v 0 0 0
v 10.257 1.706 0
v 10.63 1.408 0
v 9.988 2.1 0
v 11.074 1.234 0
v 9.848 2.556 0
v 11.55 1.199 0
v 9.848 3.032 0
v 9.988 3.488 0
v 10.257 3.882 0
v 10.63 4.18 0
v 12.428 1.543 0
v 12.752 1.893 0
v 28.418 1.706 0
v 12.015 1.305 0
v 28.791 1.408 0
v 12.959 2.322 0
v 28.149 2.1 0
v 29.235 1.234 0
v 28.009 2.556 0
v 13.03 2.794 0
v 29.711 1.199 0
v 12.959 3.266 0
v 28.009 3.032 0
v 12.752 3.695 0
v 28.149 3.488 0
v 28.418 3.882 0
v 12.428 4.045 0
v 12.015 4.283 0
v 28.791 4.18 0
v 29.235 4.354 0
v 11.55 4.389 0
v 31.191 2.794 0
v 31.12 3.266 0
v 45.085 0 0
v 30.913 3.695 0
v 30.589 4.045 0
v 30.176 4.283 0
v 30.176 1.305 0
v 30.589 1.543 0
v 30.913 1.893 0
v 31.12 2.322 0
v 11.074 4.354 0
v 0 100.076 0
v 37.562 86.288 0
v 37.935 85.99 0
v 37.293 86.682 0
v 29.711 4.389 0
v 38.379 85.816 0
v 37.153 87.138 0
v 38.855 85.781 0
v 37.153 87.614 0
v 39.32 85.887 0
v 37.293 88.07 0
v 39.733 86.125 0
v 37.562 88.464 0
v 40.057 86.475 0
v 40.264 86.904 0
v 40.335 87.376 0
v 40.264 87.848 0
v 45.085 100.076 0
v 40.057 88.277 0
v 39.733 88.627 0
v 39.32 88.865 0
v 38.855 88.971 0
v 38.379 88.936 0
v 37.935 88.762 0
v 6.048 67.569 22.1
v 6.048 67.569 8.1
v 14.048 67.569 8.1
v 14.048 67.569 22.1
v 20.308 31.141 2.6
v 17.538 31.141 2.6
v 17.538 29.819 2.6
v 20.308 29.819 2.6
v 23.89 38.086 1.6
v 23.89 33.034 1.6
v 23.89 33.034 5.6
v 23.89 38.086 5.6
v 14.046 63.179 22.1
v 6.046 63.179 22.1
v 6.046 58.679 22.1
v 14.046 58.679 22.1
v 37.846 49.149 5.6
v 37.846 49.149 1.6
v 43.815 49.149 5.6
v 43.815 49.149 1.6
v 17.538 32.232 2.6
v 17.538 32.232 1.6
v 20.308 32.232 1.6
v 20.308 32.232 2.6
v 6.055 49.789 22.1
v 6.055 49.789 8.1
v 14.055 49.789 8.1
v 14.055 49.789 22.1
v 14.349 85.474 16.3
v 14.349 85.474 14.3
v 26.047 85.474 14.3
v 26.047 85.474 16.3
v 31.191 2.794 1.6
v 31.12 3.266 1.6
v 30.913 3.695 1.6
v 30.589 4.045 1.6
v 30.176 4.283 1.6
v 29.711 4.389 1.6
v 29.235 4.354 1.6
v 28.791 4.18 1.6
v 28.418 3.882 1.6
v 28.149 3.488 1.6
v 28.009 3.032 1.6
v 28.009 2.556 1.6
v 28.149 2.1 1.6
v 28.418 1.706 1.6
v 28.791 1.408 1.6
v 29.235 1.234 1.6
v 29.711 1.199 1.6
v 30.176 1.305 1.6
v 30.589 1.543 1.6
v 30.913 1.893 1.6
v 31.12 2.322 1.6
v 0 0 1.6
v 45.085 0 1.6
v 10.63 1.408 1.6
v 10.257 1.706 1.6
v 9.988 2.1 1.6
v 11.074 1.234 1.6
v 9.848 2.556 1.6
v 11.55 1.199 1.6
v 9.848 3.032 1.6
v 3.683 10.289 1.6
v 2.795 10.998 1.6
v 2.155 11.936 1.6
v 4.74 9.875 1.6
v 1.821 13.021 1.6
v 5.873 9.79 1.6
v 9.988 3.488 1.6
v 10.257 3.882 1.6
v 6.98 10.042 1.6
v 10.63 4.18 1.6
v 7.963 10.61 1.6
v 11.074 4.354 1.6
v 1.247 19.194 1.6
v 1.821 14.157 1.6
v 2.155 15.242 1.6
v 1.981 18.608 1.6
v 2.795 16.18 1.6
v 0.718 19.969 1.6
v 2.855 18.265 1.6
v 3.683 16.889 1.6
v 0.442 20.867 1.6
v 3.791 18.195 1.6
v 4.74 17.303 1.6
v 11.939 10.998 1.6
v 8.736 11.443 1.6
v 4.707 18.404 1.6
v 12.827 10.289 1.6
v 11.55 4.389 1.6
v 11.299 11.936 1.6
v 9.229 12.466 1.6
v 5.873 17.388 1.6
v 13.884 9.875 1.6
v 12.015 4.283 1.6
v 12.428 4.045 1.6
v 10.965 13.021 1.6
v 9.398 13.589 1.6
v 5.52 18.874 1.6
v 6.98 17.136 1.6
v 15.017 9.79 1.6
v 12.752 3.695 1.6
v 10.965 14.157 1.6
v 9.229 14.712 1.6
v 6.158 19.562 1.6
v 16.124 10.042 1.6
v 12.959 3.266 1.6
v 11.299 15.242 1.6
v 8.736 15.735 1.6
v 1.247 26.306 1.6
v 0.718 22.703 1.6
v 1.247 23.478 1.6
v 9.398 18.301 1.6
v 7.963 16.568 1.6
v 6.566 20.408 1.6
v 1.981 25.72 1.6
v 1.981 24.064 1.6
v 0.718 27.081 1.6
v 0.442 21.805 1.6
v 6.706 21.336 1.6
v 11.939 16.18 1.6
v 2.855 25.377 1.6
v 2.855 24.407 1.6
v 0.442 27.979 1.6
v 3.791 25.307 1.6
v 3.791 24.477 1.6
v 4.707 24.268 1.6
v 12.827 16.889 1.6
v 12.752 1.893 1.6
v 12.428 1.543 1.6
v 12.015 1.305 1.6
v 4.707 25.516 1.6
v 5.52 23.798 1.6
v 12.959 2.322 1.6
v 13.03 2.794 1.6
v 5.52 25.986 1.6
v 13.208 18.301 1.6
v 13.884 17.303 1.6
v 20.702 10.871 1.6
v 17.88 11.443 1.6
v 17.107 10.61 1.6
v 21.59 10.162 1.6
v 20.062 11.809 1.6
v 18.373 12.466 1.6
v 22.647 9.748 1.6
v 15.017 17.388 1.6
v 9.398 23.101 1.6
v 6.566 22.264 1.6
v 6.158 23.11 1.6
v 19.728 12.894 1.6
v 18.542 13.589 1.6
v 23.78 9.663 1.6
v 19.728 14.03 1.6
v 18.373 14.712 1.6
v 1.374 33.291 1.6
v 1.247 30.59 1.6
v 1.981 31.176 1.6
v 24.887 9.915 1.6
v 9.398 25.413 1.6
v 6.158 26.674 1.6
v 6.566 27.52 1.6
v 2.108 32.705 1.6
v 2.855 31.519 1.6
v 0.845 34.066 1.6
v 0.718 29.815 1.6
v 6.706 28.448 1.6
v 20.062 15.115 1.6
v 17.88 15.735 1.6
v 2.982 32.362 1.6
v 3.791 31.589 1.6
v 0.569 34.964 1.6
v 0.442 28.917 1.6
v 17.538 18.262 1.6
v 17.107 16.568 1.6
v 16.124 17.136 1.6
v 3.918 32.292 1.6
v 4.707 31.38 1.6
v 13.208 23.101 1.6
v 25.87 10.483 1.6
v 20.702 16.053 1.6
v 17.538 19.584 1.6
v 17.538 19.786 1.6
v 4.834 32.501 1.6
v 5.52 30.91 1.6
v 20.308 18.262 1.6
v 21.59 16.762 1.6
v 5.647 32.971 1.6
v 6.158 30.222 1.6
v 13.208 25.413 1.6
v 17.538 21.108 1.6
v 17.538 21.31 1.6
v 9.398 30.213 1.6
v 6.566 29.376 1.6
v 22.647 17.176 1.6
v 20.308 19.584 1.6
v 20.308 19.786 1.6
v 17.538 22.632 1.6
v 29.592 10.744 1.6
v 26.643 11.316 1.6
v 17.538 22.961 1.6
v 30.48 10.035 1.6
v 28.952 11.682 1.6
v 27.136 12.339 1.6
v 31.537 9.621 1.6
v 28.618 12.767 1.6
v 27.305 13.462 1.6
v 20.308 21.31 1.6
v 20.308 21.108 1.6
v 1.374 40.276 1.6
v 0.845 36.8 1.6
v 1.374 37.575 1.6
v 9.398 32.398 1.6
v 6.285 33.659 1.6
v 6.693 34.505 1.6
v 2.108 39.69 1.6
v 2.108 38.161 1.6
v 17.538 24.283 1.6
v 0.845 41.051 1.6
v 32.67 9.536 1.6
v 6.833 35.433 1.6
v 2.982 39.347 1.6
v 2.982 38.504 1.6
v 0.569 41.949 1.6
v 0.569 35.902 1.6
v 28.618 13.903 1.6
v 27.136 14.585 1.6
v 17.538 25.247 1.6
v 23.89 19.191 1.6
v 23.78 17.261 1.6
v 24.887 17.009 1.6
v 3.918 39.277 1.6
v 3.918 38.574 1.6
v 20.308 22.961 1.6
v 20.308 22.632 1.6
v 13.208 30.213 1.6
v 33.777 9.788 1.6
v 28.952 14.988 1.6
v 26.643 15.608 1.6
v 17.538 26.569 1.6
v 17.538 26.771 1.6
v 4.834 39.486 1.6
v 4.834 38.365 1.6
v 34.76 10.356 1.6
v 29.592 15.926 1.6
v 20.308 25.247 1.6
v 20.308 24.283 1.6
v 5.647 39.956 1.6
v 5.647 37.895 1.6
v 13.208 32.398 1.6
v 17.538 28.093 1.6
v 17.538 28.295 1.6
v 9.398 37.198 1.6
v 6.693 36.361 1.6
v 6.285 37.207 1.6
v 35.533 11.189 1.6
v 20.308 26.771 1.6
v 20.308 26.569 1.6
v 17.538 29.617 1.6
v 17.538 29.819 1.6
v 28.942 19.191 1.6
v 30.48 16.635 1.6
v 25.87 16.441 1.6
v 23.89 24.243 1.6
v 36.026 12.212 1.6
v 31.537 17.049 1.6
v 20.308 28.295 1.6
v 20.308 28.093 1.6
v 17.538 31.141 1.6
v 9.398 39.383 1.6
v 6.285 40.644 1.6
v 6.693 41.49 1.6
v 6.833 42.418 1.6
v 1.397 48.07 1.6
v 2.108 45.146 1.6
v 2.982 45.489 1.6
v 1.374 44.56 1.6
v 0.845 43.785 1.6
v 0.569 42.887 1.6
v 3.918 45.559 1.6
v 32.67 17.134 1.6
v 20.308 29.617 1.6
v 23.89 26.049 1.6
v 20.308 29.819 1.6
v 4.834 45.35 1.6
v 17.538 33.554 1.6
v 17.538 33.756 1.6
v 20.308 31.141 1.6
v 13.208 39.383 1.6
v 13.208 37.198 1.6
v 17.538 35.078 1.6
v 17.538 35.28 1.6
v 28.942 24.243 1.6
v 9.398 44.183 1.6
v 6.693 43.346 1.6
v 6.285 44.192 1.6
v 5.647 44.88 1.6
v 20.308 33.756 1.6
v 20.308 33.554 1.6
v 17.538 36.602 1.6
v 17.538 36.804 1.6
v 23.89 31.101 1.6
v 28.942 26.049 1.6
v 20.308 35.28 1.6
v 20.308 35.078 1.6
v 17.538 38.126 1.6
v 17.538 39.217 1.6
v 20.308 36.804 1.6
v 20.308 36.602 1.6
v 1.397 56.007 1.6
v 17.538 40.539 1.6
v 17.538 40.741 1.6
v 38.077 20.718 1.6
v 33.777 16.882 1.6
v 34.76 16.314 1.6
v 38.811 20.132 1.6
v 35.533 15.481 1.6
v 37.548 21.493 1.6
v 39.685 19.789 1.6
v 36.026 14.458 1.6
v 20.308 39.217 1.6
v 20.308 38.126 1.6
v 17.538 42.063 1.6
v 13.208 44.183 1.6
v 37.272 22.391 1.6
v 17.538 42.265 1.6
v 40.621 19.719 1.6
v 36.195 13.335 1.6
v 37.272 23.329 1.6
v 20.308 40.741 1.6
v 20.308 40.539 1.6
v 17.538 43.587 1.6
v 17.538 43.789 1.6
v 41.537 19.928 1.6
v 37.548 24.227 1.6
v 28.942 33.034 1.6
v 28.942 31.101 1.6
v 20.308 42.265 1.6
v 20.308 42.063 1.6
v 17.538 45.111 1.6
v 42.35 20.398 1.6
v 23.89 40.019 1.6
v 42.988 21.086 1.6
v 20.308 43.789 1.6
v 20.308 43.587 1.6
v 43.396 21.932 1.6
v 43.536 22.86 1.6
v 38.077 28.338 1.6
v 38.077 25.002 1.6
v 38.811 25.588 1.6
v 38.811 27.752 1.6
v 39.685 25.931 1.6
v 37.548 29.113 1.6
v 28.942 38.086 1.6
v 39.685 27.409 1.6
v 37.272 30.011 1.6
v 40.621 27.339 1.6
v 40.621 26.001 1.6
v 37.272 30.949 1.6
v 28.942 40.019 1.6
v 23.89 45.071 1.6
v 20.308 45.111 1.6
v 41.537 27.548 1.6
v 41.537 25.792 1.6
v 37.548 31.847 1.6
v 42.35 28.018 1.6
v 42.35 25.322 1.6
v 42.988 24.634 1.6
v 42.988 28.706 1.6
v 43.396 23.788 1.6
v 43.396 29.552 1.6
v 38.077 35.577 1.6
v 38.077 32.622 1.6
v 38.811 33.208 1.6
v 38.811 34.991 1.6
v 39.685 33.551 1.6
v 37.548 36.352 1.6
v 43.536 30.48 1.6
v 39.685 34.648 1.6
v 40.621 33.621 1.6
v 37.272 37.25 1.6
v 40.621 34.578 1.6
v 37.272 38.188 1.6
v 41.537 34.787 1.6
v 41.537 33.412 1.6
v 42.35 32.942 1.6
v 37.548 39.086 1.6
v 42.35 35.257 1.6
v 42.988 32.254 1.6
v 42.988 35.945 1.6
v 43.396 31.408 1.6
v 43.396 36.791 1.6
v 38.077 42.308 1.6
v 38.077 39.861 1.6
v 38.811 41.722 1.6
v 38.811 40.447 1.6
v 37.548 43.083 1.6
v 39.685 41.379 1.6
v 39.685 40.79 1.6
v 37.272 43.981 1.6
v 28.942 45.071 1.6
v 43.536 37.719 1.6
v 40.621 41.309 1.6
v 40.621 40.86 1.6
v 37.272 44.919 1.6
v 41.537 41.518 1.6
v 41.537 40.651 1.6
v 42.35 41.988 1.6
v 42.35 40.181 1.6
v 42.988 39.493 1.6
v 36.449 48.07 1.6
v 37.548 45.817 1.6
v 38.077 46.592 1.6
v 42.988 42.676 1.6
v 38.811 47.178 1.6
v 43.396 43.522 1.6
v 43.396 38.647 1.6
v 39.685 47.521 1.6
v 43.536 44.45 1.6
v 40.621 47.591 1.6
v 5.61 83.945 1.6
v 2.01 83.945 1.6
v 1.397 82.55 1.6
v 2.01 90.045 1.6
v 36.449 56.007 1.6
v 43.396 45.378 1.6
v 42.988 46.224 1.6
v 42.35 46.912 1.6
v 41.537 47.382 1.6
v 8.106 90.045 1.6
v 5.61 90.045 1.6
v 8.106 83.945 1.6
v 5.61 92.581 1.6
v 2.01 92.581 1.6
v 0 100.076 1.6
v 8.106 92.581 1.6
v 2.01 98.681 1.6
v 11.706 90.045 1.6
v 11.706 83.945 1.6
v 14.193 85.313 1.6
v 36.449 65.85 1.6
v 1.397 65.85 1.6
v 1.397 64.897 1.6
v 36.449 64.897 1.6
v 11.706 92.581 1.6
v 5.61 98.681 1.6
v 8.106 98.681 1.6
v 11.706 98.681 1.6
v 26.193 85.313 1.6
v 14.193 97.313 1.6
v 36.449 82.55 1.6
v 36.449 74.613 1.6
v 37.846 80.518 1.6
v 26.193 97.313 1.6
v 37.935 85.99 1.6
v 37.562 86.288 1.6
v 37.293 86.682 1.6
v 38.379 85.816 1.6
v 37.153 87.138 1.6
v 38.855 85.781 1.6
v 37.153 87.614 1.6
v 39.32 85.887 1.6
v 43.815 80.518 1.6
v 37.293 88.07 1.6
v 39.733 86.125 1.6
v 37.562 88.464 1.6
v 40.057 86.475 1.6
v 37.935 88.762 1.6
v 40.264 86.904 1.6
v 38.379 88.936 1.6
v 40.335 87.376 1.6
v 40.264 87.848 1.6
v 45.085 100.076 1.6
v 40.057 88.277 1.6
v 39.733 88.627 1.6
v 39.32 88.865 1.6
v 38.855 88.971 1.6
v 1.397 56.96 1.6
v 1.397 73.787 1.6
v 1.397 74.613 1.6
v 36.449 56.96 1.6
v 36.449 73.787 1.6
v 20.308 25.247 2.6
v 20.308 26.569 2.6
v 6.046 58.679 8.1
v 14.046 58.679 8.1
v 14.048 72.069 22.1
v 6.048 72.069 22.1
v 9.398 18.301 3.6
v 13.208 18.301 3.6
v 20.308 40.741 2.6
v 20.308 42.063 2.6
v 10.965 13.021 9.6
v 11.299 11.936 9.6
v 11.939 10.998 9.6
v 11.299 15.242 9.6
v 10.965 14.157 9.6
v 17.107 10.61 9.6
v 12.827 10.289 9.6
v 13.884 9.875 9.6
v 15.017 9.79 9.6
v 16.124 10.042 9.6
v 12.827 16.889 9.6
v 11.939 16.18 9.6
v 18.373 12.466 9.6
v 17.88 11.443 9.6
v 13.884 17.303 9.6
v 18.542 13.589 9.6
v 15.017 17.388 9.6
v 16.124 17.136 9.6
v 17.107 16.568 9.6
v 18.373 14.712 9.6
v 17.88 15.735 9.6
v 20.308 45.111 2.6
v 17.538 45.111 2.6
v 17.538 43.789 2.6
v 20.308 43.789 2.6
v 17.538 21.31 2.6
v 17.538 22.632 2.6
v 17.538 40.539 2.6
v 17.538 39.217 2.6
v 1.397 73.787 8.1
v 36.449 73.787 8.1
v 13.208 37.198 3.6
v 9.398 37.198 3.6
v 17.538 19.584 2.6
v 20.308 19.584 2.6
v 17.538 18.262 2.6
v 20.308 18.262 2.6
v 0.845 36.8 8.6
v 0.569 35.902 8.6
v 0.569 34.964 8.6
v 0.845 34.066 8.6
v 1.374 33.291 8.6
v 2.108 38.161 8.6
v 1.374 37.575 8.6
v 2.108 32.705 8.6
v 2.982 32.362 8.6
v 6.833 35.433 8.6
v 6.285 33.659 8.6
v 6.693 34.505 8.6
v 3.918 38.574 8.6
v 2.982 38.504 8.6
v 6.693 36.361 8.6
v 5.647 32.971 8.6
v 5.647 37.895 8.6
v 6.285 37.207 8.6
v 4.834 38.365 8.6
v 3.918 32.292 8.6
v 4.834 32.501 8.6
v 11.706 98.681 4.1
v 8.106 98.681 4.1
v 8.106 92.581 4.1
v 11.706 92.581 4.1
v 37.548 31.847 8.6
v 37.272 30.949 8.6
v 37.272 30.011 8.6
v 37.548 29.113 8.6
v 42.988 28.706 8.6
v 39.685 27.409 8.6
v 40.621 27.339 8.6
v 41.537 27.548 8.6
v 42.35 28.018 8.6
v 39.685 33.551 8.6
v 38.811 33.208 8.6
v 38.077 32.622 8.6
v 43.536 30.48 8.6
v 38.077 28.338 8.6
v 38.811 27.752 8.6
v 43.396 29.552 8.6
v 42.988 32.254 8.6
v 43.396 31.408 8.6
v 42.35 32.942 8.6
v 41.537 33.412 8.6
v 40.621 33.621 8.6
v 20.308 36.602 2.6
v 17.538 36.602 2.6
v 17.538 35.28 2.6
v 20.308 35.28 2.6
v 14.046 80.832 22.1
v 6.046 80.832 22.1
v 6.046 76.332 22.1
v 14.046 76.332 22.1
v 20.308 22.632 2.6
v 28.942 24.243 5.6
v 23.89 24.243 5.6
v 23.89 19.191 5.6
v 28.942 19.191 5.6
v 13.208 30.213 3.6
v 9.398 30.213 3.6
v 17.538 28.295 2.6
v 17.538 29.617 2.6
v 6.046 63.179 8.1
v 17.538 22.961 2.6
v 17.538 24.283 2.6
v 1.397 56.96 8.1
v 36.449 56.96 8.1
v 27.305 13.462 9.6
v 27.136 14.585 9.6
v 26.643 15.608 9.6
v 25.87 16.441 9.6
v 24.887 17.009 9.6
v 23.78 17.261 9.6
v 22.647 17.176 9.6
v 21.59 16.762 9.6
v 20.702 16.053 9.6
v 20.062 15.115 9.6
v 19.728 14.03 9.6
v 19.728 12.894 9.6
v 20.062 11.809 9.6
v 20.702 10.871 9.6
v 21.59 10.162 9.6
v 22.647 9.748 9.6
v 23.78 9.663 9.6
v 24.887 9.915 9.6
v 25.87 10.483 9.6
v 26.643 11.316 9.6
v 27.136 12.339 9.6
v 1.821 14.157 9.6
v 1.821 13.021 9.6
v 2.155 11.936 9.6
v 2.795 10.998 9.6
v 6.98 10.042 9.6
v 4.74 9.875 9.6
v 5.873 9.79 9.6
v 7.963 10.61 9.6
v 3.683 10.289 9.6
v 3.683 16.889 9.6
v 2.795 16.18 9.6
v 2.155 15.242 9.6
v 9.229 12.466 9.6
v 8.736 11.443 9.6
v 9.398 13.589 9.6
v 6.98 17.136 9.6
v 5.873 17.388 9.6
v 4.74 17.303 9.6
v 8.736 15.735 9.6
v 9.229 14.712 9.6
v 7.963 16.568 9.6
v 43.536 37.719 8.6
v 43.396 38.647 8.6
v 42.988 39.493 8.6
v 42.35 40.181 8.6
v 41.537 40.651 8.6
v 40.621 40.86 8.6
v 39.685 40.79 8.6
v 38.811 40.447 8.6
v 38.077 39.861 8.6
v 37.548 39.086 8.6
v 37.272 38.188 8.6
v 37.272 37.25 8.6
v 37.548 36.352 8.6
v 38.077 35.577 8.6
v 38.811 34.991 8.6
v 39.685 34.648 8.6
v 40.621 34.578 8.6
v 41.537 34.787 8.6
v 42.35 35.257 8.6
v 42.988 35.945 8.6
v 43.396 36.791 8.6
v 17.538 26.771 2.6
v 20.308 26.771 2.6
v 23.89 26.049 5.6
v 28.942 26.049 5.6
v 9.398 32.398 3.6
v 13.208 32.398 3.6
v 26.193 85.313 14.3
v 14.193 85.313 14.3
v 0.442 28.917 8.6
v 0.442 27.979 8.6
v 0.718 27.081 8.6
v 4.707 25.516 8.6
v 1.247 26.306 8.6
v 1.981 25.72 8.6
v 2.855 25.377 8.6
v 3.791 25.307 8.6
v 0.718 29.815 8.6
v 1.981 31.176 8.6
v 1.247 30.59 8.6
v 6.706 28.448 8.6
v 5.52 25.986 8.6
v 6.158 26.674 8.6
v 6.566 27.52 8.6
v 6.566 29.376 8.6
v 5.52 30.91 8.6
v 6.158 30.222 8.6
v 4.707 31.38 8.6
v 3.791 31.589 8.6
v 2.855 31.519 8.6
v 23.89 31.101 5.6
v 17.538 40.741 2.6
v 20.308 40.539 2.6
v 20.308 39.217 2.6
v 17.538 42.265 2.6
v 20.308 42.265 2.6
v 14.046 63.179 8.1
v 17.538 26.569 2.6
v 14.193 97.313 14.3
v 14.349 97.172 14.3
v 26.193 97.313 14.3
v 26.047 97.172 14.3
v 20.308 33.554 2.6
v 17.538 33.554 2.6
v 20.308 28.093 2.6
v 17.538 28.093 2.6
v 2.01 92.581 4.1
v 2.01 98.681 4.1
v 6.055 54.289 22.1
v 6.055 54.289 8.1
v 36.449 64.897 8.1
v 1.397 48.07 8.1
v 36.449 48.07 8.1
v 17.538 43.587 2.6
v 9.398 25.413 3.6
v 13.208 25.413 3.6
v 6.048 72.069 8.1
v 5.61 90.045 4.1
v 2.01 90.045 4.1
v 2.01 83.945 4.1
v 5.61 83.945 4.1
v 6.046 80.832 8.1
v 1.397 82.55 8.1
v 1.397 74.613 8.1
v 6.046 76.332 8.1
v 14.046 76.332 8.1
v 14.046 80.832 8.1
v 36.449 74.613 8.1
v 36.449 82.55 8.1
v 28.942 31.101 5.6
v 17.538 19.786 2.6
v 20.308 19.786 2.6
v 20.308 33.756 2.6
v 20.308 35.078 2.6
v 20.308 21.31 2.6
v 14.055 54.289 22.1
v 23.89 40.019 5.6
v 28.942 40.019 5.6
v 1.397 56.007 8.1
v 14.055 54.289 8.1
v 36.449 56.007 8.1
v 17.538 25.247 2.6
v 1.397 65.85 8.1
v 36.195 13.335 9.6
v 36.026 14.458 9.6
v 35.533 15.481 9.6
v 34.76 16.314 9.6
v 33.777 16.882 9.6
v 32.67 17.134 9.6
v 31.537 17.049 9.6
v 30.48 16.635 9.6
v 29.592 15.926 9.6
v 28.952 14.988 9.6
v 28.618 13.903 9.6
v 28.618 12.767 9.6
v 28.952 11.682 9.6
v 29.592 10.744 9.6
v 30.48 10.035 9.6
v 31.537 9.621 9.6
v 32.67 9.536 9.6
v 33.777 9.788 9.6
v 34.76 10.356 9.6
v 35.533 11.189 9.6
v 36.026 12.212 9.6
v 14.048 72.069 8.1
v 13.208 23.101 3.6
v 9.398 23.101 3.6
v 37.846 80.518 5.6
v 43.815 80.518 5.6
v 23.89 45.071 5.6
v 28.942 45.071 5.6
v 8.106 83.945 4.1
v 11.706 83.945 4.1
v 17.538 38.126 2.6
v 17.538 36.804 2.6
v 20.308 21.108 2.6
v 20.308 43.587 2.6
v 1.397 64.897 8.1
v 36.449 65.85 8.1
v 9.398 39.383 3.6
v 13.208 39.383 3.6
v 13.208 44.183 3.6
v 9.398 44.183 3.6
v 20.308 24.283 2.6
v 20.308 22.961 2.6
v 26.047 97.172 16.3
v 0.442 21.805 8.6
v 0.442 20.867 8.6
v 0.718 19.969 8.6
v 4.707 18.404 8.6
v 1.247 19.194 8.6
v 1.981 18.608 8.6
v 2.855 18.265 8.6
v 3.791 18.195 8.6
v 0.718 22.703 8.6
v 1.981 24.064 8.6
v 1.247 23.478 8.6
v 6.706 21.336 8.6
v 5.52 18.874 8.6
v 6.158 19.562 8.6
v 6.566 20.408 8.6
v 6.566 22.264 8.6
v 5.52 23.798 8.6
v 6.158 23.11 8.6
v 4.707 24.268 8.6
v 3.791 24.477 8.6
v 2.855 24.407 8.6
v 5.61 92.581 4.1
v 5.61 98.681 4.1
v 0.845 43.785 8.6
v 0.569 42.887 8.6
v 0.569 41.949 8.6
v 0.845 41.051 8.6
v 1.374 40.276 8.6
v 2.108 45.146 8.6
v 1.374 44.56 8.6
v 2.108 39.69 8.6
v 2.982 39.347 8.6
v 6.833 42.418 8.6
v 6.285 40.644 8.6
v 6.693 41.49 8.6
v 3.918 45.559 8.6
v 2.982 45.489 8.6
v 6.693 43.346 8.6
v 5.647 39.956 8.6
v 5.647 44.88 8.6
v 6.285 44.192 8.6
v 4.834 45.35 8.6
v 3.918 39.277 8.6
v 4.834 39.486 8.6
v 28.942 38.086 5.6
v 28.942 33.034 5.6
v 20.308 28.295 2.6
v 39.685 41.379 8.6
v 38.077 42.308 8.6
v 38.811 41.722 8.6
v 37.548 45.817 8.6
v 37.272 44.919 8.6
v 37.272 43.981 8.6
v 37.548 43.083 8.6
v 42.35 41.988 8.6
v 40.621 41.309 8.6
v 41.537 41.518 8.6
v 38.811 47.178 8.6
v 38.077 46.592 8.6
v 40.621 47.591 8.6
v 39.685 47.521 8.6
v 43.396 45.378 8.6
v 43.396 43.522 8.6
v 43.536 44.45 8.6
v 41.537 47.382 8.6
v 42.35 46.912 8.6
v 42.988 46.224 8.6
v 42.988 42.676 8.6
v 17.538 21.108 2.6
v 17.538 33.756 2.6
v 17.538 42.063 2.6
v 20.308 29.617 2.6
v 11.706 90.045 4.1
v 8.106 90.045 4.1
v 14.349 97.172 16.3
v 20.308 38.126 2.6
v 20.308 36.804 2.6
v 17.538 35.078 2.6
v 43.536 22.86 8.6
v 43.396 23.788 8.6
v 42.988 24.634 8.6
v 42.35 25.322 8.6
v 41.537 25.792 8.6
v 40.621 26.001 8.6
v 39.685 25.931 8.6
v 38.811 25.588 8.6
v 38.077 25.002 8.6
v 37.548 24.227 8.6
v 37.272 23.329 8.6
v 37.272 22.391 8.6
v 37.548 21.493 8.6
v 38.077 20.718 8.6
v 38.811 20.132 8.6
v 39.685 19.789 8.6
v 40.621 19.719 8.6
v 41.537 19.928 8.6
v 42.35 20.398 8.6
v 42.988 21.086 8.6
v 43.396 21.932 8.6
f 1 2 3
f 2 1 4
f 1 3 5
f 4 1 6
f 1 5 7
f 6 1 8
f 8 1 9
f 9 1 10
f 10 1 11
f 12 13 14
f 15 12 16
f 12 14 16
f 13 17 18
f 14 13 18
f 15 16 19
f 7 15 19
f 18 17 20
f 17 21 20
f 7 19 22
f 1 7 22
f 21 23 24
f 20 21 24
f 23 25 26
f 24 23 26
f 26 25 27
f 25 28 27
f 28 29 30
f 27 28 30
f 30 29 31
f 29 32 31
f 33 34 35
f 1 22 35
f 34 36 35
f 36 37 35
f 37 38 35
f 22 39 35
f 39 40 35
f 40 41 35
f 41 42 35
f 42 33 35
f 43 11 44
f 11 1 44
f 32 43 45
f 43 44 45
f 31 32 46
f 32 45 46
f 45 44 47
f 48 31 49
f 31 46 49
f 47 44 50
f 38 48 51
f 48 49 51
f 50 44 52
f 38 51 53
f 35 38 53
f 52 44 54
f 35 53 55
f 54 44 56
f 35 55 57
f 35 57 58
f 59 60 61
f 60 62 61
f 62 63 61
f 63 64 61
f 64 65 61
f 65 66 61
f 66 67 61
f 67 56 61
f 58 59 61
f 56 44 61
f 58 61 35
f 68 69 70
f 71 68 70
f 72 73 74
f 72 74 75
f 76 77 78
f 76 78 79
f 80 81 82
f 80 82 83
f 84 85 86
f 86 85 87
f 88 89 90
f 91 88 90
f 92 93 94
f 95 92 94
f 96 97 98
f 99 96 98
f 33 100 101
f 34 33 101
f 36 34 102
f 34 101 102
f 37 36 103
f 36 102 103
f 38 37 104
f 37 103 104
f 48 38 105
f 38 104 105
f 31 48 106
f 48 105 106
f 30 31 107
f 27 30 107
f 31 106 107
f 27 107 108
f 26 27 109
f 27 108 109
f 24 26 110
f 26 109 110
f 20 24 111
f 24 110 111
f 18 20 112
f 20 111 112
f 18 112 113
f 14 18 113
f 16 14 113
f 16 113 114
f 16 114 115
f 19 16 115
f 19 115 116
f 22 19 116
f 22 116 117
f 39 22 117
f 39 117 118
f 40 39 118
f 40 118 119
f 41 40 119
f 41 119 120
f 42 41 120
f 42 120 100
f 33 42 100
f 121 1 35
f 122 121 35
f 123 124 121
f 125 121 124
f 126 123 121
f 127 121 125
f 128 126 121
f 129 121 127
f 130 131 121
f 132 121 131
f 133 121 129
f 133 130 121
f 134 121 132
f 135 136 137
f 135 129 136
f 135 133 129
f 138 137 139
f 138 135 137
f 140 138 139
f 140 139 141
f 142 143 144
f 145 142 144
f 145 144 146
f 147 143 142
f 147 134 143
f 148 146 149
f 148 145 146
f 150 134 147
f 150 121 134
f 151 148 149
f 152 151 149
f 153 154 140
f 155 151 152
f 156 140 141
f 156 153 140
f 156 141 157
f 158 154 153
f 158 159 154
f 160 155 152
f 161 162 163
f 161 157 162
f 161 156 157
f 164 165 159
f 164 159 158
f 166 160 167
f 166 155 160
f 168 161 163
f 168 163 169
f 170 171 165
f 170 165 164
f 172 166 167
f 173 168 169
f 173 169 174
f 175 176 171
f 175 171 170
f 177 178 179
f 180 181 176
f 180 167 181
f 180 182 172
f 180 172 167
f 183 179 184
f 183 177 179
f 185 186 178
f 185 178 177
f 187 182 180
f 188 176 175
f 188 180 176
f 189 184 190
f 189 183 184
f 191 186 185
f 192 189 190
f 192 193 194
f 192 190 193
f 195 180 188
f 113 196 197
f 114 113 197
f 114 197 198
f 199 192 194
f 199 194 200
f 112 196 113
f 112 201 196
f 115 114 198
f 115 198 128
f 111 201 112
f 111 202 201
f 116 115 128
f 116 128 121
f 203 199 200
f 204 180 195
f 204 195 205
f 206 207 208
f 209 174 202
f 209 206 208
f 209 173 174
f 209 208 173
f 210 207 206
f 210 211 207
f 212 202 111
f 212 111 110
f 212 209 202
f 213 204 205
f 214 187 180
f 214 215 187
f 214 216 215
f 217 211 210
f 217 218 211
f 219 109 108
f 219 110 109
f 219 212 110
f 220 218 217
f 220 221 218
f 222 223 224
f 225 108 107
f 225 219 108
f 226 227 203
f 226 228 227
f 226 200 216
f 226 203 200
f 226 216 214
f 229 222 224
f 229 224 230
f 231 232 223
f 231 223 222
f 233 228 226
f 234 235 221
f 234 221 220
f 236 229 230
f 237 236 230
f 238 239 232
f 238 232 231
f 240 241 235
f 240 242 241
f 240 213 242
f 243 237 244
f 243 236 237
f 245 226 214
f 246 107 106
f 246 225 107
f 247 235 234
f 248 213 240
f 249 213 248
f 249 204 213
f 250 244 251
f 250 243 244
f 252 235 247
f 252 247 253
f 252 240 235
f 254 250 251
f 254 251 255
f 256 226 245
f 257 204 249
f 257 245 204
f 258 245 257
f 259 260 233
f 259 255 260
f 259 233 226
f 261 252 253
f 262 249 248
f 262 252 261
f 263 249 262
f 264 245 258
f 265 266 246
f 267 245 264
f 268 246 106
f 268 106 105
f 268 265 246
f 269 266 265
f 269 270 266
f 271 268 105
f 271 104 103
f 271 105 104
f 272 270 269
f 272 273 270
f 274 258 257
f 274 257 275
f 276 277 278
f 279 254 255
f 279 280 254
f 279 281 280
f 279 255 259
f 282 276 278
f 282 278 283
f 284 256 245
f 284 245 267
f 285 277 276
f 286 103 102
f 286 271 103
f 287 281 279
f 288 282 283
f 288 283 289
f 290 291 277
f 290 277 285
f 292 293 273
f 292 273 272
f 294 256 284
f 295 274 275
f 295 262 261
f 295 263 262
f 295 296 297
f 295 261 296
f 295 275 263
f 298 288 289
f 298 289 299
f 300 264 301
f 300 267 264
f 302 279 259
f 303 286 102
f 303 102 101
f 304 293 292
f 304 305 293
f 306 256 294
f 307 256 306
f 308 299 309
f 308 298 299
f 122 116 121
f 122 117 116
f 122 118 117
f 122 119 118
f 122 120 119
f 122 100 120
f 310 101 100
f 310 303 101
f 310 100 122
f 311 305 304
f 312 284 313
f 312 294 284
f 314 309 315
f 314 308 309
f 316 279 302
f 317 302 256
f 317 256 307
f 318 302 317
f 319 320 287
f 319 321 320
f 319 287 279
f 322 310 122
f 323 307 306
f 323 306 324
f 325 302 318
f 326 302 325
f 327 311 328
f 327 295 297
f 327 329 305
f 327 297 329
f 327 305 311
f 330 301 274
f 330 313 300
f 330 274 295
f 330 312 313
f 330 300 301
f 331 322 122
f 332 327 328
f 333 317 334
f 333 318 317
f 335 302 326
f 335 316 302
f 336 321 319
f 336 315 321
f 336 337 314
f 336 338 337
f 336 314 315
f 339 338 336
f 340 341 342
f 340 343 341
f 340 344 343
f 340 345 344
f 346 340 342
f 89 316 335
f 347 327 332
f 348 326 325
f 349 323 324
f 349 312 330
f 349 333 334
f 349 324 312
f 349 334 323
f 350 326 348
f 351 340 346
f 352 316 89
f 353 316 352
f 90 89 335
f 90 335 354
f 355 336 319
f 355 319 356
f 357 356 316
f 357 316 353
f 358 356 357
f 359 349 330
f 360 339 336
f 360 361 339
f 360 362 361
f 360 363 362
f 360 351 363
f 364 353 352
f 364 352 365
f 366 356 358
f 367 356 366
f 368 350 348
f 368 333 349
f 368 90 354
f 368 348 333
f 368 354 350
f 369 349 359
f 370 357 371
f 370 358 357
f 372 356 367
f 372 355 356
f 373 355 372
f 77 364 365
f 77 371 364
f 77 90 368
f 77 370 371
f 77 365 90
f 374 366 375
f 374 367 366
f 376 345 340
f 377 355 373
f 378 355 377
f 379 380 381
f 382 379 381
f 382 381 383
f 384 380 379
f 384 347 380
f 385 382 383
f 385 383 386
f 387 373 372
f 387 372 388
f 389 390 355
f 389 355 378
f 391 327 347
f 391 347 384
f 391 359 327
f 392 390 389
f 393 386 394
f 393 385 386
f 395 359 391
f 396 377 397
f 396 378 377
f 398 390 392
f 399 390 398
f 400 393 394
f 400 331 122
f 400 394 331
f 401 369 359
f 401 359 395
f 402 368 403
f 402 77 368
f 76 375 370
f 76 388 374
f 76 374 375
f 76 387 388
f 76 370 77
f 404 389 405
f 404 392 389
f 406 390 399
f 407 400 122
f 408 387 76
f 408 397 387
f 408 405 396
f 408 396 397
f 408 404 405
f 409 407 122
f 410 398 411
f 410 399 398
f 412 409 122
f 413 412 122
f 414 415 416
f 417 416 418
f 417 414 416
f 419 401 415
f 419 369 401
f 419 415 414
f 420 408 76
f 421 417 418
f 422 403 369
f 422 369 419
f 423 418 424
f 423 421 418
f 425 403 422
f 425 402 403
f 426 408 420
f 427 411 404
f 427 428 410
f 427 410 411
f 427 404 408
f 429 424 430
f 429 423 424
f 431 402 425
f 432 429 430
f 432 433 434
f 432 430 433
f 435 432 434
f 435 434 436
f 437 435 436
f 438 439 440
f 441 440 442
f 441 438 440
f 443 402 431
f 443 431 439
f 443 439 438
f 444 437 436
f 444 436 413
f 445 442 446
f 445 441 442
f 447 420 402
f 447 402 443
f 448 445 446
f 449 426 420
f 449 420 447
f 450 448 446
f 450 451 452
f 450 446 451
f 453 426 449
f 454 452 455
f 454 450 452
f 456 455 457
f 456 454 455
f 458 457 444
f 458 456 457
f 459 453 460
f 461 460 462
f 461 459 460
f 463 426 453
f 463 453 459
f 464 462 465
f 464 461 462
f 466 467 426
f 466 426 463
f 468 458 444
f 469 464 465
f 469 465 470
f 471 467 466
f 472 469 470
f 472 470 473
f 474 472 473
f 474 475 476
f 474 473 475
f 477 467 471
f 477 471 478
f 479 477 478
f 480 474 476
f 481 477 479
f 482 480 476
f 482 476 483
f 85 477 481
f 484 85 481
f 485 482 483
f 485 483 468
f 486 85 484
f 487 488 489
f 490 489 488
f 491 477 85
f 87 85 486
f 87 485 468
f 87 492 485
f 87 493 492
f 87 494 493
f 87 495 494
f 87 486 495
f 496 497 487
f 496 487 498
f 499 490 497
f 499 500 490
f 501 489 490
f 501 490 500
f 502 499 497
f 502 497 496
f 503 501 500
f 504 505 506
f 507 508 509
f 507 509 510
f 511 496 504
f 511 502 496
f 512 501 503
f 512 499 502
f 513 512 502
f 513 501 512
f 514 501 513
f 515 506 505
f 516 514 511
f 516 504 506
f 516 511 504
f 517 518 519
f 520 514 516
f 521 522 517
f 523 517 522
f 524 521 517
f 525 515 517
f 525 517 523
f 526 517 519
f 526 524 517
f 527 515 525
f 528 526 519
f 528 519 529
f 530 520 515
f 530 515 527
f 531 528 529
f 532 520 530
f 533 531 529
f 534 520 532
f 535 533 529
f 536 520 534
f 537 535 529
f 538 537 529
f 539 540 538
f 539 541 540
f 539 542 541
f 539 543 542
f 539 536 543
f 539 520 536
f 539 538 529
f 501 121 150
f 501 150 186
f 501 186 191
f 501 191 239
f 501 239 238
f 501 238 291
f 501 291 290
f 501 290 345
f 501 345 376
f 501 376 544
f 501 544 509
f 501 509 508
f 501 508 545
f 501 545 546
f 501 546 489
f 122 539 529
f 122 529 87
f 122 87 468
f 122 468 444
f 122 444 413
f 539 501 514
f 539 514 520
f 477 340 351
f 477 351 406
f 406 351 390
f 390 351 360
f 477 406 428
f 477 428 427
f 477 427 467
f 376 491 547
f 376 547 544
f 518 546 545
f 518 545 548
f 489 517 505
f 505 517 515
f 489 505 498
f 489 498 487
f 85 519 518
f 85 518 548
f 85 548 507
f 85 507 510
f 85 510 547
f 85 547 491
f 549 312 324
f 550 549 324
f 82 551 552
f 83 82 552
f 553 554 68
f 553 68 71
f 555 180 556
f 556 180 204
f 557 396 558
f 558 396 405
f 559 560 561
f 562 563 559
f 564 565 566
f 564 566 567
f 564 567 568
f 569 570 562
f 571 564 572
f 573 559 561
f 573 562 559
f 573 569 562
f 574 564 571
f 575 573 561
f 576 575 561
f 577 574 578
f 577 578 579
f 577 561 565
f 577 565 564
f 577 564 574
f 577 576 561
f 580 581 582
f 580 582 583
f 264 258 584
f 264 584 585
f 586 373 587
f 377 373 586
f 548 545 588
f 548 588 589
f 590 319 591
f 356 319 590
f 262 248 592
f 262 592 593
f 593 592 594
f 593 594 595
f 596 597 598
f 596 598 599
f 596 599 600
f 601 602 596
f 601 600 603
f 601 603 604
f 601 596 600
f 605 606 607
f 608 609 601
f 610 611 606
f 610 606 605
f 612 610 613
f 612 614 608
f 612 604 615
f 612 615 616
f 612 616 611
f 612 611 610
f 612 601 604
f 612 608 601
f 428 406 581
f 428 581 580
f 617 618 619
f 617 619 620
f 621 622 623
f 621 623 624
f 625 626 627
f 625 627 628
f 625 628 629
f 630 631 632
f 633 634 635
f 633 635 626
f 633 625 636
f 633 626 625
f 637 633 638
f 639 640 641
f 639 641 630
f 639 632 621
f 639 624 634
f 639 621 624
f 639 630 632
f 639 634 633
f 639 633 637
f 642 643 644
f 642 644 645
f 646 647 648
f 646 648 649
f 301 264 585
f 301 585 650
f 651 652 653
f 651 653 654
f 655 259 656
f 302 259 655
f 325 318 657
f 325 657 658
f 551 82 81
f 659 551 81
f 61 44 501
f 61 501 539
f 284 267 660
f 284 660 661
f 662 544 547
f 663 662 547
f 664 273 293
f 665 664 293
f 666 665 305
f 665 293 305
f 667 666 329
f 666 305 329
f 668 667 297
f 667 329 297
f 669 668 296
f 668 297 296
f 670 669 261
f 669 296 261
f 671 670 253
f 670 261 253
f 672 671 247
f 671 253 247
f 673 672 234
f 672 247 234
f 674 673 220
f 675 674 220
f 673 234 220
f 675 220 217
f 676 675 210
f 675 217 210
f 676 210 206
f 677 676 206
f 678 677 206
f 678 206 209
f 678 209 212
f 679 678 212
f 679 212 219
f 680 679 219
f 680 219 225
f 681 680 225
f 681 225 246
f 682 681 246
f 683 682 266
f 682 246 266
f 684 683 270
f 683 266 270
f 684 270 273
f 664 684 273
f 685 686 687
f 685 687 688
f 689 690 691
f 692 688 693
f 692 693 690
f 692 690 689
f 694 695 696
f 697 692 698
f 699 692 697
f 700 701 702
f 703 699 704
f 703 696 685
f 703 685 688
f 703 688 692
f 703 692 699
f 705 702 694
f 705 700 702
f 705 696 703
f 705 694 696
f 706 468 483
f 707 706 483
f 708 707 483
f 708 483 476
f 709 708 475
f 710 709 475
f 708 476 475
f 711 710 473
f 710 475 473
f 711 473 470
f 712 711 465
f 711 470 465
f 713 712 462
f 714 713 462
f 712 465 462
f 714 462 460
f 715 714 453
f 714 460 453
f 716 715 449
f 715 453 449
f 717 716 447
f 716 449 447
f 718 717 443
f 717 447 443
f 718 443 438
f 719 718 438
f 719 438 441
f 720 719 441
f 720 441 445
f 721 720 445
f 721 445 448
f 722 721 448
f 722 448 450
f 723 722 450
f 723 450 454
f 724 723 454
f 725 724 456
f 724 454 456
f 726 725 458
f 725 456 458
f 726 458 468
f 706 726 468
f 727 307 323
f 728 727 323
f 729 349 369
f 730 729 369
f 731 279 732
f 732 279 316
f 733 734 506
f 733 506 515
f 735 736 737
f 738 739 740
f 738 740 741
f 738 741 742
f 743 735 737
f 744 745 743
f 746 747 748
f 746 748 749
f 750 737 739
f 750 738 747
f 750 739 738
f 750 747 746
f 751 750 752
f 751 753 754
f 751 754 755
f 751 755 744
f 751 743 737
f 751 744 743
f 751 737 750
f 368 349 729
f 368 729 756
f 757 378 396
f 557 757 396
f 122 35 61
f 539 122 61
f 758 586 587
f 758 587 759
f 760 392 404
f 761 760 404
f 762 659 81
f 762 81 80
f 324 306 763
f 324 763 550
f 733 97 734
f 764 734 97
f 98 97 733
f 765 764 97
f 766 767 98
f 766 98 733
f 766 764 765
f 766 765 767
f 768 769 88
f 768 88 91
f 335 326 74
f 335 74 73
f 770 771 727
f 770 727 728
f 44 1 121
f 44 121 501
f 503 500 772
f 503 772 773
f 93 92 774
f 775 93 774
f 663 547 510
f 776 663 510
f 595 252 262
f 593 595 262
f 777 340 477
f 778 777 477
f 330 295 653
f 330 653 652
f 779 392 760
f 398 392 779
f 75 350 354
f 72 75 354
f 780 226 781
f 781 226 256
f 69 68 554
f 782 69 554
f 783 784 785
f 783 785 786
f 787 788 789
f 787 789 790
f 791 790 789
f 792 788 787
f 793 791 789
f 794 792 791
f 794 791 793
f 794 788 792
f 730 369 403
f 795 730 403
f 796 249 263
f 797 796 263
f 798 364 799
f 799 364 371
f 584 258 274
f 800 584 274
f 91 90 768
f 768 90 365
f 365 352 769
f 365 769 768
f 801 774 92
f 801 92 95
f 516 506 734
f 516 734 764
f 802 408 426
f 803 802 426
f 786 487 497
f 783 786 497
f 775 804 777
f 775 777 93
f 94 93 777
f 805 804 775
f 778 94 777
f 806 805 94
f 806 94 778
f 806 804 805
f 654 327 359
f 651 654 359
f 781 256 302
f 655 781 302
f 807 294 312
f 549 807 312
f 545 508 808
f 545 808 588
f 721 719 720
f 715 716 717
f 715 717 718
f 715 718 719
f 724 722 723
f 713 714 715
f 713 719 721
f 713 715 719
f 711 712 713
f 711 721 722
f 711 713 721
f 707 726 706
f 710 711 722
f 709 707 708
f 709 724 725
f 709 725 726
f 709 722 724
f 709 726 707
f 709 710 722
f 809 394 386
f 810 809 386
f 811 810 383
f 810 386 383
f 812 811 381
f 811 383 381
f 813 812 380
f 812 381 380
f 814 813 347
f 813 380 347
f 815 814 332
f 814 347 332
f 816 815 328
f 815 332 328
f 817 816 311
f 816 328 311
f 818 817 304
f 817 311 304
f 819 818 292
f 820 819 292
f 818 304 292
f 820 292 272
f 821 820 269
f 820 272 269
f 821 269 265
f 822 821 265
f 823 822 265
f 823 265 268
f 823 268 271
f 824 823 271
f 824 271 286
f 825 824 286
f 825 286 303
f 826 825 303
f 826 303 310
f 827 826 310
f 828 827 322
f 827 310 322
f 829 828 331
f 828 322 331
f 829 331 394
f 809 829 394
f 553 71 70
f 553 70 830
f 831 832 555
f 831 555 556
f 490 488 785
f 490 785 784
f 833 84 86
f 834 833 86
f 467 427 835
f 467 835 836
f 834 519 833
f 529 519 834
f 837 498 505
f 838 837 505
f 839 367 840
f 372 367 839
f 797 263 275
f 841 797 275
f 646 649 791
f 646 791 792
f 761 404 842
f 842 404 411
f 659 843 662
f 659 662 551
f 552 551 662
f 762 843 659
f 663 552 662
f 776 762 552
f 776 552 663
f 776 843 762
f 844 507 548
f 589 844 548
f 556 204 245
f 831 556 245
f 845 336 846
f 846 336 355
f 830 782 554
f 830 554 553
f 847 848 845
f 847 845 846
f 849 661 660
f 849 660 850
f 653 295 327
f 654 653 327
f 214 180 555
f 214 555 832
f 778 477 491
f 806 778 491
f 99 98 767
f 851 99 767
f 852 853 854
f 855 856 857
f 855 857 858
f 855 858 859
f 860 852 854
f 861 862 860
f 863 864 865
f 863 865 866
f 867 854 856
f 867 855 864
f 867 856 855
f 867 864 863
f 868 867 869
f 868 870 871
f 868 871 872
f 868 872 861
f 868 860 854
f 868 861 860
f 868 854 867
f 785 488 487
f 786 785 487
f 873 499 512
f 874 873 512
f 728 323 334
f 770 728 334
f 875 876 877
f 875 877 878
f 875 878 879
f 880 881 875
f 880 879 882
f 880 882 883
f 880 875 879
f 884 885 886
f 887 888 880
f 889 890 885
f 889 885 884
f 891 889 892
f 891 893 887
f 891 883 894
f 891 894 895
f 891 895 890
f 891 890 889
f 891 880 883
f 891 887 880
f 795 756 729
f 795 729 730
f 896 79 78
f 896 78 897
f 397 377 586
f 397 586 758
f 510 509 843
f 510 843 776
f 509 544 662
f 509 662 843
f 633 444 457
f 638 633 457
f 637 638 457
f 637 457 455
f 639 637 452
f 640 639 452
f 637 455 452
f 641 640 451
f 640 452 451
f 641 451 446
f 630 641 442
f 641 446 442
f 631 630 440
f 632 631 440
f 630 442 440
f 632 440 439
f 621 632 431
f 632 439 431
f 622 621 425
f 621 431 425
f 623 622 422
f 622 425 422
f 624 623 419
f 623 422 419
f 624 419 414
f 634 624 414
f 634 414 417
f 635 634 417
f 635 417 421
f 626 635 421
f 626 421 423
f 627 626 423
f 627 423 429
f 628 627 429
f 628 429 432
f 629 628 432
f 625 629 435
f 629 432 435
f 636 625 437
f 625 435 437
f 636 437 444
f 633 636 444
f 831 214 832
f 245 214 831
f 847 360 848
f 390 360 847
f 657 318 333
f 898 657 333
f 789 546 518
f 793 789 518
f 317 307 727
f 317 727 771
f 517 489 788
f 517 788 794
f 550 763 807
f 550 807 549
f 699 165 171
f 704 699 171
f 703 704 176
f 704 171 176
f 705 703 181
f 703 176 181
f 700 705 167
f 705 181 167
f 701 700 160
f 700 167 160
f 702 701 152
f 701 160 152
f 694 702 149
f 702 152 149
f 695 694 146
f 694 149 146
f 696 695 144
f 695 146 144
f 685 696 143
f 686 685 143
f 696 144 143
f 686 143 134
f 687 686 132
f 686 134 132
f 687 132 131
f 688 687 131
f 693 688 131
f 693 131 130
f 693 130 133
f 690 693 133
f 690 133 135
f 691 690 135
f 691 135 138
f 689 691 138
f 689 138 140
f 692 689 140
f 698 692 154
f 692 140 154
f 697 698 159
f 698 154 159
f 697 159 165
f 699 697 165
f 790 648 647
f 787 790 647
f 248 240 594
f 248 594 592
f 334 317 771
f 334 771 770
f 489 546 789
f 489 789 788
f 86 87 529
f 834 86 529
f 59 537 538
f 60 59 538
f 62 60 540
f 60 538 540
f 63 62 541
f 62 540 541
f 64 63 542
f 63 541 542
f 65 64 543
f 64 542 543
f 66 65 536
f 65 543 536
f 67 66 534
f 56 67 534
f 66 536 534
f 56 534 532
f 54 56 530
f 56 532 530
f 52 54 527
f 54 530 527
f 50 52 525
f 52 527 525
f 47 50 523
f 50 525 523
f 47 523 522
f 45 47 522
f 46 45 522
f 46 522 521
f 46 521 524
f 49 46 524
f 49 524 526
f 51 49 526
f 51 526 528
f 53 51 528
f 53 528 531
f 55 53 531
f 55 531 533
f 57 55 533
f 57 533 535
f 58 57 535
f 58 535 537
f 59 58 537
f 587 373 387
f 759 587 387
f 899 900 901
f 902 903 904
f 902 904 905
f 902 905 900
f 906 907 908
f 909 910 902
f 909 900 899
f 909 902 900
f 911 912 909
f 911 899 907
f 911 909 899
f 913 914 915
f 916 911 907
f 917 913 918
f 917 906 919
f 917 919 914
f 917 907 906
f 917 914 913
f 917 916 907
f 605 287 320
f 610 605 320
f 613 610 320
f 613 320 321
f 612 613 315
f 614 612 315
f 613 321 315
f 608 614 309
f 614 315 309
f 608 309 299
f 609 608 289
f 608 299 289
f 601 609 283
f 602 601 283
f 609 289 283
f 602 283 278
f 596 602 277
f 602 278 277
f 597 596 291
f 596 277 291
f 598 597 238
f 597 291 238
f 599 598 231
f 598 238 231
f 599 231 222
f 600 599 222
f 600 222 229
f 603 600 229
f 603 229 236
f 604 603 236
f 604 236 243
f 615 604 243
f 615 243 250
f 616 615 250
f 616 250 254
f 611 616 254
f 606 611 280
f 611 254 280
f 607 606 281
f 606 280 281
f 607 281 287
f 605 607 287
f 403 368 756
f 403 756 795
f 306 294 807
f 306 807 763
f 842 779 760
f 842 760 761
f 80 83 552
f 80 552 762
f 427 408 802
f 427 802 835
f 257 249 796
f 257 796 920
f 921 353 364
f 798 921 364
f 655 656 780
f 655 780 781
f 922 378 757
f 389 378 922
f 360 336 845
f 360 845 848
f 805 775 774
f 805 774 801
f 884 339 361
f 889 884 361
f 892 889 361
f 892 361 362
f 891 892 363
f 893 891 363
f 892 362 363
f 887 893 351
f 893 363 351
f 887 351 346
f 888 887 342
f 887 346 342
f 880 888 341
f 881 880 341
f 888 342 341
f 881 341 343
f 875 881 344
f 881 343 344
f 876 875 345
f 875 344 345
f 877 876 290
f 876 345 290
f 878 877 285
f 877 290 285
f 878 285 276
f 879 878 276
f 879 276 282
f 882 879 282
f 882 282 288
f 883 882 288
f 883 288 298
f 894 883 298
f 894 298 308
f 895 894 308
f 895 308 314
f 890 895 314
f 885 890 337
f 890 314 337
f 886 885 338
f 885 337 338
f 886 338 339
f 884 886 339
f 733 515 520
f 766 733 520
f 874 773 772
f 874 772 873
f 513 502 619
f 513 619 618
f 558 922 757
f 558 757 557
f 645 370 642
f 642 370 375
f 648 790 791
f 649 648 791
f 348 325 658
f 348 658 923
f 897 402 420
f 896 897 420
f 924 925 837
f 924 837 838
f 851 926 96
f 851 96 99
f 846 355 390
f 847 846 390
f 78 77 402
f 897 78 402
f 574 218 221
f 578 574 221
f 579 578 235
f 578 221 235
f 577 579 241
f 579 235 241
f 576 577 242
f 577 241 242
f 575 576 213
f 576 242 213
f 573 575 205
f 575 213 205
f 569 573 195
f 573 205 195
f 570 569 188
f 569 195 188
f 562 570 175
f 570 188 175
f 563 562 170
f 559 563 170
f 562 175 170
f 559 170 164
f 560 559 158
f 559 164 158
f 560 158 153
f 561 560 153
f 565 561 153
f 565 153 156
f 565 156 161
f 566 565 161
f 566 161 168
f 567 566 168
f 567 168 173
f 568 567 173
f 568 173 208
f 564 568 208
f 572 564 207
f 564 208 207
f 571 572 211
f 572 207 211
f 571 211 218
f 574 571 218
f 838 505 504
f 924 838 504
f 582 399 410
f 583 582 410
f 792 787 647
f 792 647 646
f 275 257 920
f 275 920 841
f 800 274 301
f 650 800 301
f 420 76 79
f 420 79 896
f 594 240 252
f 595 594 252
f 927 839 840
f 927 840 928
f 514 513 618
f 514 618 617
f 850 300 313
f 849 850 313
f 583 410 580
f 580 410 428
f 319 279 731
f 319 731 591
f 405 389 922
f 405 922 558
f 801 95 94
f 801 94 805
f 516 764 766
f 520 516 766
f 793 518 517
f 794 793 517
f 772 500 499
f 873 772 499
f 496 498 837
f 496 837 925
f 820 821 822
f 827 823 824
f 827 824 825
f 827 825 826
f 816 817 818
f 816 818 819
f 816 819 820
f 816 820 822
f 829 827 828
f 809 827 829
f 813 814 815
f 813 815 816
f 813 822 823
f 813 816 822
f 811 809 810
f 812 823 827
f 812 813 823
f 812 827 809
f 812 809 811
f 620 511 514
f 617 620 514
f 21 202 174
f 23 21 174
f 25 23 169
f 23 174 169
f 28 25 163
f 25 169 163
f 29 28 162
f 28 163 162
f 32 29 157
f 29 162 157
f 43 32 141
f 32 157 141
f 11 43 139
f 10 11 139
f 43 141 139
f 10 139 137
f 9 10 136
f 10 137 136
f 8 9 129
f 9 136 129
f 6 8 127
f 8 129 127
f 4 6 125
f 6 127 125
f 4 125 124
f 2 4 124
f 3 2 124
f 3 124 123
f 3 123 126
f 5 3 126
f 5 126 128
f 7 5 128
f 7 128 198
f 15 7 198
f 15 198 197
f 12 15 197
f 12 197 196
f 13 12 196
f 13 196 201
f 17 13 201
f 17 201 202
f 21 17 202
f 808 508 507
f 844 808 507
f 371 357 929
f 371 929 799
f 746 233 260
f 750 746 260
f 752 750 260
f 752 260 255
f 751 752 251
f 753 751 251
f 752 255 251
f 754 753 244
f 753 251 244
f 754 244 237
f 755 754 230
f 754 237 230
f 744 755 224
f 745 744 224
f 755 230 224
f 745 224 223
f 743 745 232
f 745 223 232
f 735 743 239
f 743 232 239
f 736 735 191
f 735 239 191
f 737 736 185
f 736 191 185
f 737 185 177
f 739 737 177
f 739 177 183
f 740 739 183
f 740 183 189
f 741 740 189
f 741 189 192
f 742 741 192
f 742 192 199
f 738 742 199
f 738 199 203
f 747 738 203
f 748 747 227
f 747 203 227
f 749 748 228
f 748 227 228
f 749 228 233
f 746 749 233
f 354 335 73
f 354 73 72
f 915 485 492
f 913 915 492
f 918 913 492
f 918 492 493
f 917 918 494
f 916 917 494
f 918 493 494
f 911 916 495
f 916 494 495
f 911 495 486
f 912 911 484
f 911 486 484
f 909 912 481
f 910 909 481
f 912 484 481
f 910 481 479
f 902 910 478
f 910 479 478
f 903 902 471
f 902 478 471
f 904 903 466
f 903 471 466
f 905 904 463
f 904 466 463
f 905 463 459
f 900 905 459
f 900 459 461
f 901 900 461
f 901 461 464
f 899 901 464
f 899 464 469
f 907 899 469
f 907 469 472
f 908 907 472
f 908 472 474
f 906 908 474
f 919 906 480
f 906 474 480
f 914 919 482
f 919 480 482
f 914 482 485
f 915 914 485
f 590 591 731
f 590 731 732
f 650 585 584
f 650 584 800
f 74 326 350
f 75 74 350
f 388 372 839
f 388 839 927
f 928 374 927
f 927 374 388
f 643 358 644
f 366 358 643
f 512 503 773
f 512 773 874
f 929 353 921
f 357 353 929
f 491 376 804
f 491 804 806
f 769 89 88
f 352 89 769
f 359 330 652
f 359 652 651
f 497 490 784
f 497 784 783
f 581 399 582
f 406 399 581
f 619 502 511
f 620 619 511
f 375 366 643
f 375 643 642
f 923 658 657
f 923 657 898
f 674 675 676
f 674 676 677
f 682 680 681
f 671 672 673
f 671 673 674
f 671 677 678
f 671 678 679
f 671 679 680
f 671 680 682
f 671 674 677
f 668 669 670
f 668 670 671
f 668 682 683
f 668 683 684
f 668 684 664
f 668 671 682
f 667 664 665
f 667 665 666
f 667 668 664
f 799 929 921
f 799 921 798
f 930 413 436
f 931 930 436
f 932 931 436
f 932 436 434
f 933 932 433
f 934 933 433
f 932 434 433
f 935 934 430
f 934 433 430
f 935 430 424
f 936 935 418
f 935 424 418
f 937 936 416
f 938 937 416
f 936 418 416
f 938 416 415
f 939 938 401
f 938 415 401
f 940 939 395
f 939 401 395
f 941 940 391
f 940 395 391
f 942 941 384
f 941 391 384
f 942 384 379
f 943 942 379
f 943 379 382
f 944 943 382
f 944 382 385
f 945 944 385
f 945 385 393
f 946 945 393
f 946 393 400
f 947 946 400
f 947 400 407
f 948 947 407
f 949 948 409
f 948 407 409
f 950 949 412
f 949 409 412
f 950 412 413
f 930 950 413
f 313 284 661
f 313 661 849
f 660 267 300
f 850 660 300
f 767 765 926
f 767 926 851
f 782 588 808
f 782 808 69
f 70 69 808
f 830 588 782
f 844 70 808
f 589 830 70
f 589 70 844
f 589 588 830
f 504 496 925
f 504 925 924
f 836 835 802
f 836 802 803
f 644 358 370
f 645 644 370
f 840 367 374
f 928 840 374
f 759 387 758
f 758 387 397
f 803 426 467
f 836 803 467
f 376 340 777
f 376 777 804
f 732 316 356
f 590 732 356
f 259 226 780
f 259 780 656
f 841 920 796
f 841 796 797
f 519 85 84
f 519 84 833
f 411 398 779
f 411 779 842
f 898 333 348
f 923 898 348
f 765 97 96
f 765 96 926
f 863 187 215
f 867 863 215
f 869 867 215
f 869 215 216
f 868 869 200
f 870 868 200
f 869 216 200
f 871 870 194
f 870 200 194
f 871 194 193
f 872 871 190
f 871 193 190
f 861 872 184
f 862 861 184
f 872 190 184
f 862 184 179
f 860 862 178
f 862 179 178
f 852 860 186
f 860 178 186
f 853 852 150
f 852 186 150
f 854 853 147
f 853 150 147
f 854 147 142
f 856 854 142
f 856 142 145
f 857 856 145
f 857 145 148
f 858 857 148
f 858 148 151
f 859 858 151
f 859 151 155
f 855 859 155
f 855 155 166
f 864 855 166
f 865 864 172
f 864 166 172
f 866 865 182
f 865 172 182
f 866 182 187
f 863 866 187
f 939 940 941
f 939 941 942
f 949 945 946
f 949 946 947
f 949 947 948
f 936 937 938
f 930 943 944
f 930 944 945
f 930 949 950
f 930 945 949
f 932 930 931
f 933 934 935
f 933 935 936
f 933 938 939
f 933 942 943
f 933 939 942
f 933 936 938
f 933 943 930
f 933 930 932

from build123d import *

# Parameters (mm, degrees)
SKETCH_2_W          = 45.085
SKETCH_2_H          = 100.076
EXTRUDE_1_DEPTH     = 1.6
SKETCH_3_W          = 3.6000436
SKETCH_3_H          = 6.0999624
EXTRUDE_2_DEPTH     = 2.5
SKETCH_4_W          = 35.0519492
SKETCH_4_H          = 7.9370174
EXTRUDE_3_DEPTH     = 6.5
SKETCH_5_W          = 8
SKETCH_5_H          = 4.5
EXTRUDE_4_DEPTH     = 14
SKETCH_6_W          = 11.999976
SKETCH_6_H          = 11.999976
EXTRUDE_5_DEPTH     = 12.7
SKETCH_8_W          = 11.69819953
SKETCH_8_H          = 11.69819953
EXTRUDE_8_DEPTH     = 2
SKETCH_9_R          = 1.599946
CUT_EXTRUDE_1_DEPTH = 2
SKETCH_10_R         = 3.81
EXTRUDE_9_DEPTH     = 8
SKETCH_11_W         = 5.969
SKETCH_11_H         = 31.369
EXTRUDE_10_DEPTH    = 4
SKETCH_12_W         = 3.81
SKETCH_12_H         = 4.800092
EXTRUDE_11_DEPTH    = 2
SKETCH_13_R         = 3.1496
EXTRUDE_12_DEPTH    = 7
SKETCH_14_W         = 2.7701748
SKETCH_14_H         = 1.3212064
EXTRUDE_13_DEPTH    = 1
SKETCH_15_W         = 5.0524156
SKETCH_15_H         = 5.0524156
EXTRUDE_14_DEPTH    = 4


with BuildPart() as part:
    # 草图2 → 凸台-拉伸1 (new body)
    with BuildSketch(Plane.XY):
        with Locations((22.5425, 50.038)):
            Rectangle(SKETCH_2_W, SKETCH_2_H)
    extrude(amount=EXTRUDE_1_DEPTH)

    # 草图3 → 凸台-拉伸2 (add)
    with BuildSketch(Plane.XY.offset(1.6)):
        with Locations((3.81, 95.631)):
            Rectangle(SKETCH_3_W, SKETCH_3_H)
        with Locations((9.906, 95.631)):
            Rectangle(SKETCH_3_W, SKETCH_3_H)
        with Locations((3.81, 86.995)):
            Rectangle(SKETCH_3_W, SKETCH_3_H)
        with Locations((9.906, 86.995)):
            Rectangle(SKETCH_3_W, SKETCH_3_H)
    extrude(amount=EXTRUDE_2_DEPTH)

    # 草图4 → 凸台-拉伸3 (add)
    with BuildSketch(Plane.XY.offset(1.6)):
        with Locations((18.923, 78.5815421)):
            Rectangle(SKETCH_4_W, SKETCH_4_H)
        with Locations((18.923, 69.8185421)):
            Rectangle(SKETCH_4_W, SKETCH_4_H)
        with Locations((18.923, 60.9285421)):
            Rectangle(SKETCH_4_W, SKETCH_4_H)
        with Locations((18.923, 52.0385421)):
            Rectangle(SKETCH_4_W, SKETCH_4_H)
    extrude(amount=EXTRUDE_3_DEPTH)

    # 草图5 → 凸台-拉伸4 (add)
    with BuildSketch(Plane.XY.offset(8.1)):
        with Locations((10.046059562, 78.5815421)):
            Rectangle(SKETCH_5_W, SKETCH_5_H)
        with Locations((10.047675227, 69.8185421)):
            Rectangle(SKETCH_5_W, SKETCH_5_H)
        with Locations((10.046401334, 60.9285421)):
            Rectangle(SKETCH_5_W, SKETCH_5_H)
        with Locations((10.054884801, 52.0385421)):
            Rectangle(SKETCH_5_W, SKETCH_5_H)
    extrude(amount=EXTRUDE_4_DEPTH)

    # 草图6 → 凸台-拉伸5 (add)
    with BuildSketch(Plane.XY.offset(1.6)):
        with Locations((20.193, 91.313)):
            Rectangle(SKETCH_6_W, SKETCH_6_H)
    extrude(amount=EXTRUDE_5_DEPTH)

    # 草图8 → 凸台-拉伸8 (add)
    with BuildSketch(Plane.XY.offset(14.3)):
        with Locations((20.198016327, 91.323022246)):
            Rectangle(SKETCH_8_W, SKETCH_8_H)
    extrude(amount=EXTRUDE_8_DEPTH)

    # 草图9 → 切除-拉伸1 (cut)
    with BuildSketch(Plane.XY.offset(1.6)):
        with Locations((38.735, 87.376)):
            Circle(SKETCH_9_R)
        with Locations((29.591, 2.794)):
            Circle(SKETCH_9_R)
        with Locations((11.43, 2.794)):
            Circle(SKETCH_9_R)
    extrude(amount=-CUT_EXTRUDE_1_DEPTH, mode=Mode.SUBTRACT)

    # 草图10 → 凸台-拉伸9 (add)
    with BuildSketch(Plane.XY.offset(1.6)):
        with Locations((5.588, 13.589)):
            Circle(SKETCH_10_R)
        with Locations((14.732, 13.589)):
            Circle(SKETCH_10_R)
        with Locations((23.495, 13.462)):
            Circle(SKETCH_10_R)
        with Locations((32.385, 13.335)):
            Circle(SKETCH_10_R)
    extrude(amount=EXTRUDE_9_DEPTH)

    # 草图11 → 凸台-拉伸10 (add)
    with BuildSketch(Plane.XY.offset(1.6)):
        with Locations((40.8305, 64.8335)):
            Rectangle(SKETCH_11_W, SKETCH_11_H)
    extrude(amount=EXTRUDE_10_DEPTH)

    # 草图12 → 凸台-拉伸11 (add)
    with BuildSketch(Plane.XY.offset(1.6)):
        with Locations((11.303, 41.783)):
            Rectangle(SKETCH_12_W, SKETCH_12_H)
        with Locations((11.303, 34.798)):
            Rectangle(SKETCH_12_W, SKETCH_12_H)
        with Locations((11.303, 27.813)):
            Rectangle(SKETCH_12_W, SKETCH_12_H)
        with Locations((11.303, 20.701)):
            Rectangle(SKETCH_12_W, SKETCH_12_H)
    extrude(amount=EXTRUDE_11_DEPTH)

    # 草图13 → 凸台-拉伸12 (add)
    with BuildSketch(Plane.XY.offset(1.6)):
        with Locations((3.683, 42.418)):
            Circle(SKETCH_13_R)
        with Locations((3.683, 35.433)):
            Circle(SKETCH_13_R)
        with Locations((3.556, 28.448)):
            Circle(SKETCH_13_R)
        with Locations((3.556, 21.336)):
            Circle(SKETCH_13_R)
        with Locations((40.386, 44.45)):
            Circle(SKETCH_13_R)
        with Locations((40.386, 37.719)):
            Circle(SKETCH_13_R)
        with Locations((40.386, 30.48)):
            Circle(SKETCH_13_R)
        with Locations((40.386, 22.86)):
            Circle(SKETCH_13_R)
    extrude(amount=EXTRUDE_12_DEPTH)

    # 草图14 → 凸台-拉伸13 (add)
    with BuildSketch(Plane.XY.offset(1.6)):
        with Locations((18.923, 44.45)):
            Rectangle(SKETCH_14_W, SKETCH_14_H)
        with Locations((18.923, 42.926)):
            Rectangle(SKETCH_14_W, SKETCH_14_H)
        with Locations((18.923, 41.402)):
            Rectangle(SKETCH_14_W, SKETCH_14_H)
        with Locations((18.923, 39.878)):
            Rectangle(SKETCH_14_W, SKETCH_14_H)
        with Locations((18.923, 37.465)):
            Rectangle(SKETCH_14_W, SKETCH_14_H)
        with Locations((18.923, 35.941)):
            Rectangle(SKETCH_14_W, SKETCH_14_H)
        with Locations((18.923, 34.417)):
            Rectangle(SKETCH_14_W, SKETCH_14_H)
        with Locations((18.923, 32.893)):
            Rectangle(SKETCH_14_W, SKETCH_14_H)
        with Locations((18.923, 30.48)):
            Rectangle(SKETCH_14_W, SKETCH_14_H)
        with Locations((18.923, 18.923)):
            Rectangle(SKETCH_14_W, SKETCH_14_H)
        with Locations((18.923, 20.447)):
            Rectangle(SKETCH_14_W, SKETCH_14_H)
        with Locations((18.923, 21.971)):
            Rectangle(SKETCH_14_W, SKETCH_14_H)
        with Locations((18.923, 23.622)):
            Rectangle(SKETCH_14_W, SKETCH_14_H)
        with Locations((18.923, 25.908)):
            Rectangle(SKETCH_14_W, SKETCH_14_H)
        with Locations((18.923, 27.432)):
            Rectangle(SKETCH_14_W, SKETCH_14_H)
        with Locations((18.923, 28.956)):
            Rectangle(SKETCH_14_W, SKETCH_14_H)
    extrude(amount=EXTRUDE_13_DEPTH)

    # 草图15 → 凸台-拉伸14 (add)
    with BuildSketch(Plane.XY.offset(1.6)):
        with Locations((26.416, 42.545)):
            Rectangle(SKETCH_15_W, SKETCH_15_H)
        with Locations((26.416, 35.56)):
            Rectangle(SKETCH_15_W, SKETCH_15_H)
        with Locations((26.416, 28.575)):
            Rectangle(SKETCH_15_W, SKETCH_15_H)
        with Locations((26.416, 21.717)):
            Rectangle(SKETCH_15_W, SKETCH_15_H)
    extrude(amount=EXTRUDE_14_DEPTH)


solid = part.part
